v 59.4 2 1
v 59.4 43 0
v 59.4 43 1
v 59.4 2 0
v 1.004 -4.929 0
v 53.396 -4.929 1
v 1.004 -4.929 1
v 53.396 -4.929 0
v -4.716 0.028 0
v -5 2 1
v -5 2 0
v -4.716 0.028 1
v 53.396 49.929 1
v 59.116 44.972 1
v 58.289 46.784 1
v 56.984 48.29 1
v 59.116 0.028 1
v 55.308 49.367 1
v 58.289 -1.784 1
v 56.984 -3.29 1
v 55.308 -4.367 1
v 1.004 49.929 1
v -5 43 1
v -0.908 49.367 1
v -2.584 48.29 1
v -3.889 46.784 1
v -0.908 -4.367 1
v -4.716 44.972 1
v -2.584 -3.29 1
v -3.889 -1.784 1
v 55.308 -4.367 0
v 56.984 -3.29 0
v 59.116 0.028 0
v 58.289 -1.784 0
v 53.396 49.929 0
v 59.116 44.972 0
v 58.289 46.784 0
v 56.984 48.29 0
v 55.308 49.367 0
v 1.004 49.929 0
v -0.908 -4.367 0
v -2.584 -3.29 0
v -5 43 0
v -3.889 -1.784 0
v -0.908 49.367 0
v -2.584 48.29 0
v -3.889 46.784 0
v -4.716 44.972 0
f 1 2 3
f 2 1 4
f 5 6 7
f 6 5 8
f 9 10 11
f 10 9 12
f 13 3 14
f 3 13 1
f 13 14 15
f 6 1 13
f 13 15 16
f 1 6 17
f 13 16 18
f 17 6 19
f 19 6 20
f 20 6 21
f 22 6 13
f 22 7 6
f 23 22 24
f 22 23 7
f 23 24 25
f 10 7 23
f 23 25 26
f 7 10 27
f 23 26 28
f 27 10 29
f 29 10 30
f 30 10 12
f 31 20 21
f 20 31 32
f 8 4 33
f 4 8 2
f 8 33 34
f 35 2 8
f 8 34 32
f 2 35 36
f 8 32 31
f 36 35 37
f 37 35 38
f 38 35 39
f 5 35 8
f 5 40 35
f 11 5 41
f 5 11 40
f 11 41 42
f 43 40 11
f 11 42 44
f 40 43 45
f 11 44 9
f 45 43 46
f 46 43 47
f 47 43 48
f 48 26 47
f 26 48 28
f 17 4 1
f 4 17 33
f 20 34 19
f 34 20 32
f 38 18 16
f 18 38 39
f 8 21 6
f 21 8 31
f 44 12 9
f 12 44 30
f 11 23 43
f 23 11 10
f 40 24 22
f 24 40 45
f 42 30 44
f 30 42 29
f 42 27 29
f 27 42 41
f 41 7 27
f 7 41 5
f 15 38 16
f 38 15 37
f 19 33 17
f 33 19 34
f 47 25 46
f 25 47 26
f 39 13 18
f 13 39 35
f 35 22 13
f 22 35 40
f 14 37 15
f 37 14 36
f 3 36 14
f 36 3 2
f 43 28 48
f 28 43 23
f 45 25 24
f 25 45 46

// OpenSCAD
a=10;
linear_extrude(height=1)translate([64.4/2-a/2,55/2-a/2])round_square(x=54.4+a,y=45+a,r=7);
linear_extrude(height=2)difference() {
    translate([64.4/2-a/2,55/2-a/2])round_square(x=54.4+a,y=45+a,r=7);
    translate([-0.8,-1.2])import("teilfabriko.dxf");    
}
module round_square(x,y=0,r=0) {
    if(y==0) {
        hull()tr_xy(x=x/2-r)circle(r=r);
    } else {
        hull()tr_xy(x=x/2-r,y=y/2-r)circle(r=r);
    }
}
module tr_xy(x,y=0) {
	if(y==0) {
		for(i=[-1,1])for(j=[-1,1])translate([x*i,x*j])children();
	} else {
		for(i=[-1,1])for(j=[-1,1])translate([x*i,y*j])children();
	}
}
